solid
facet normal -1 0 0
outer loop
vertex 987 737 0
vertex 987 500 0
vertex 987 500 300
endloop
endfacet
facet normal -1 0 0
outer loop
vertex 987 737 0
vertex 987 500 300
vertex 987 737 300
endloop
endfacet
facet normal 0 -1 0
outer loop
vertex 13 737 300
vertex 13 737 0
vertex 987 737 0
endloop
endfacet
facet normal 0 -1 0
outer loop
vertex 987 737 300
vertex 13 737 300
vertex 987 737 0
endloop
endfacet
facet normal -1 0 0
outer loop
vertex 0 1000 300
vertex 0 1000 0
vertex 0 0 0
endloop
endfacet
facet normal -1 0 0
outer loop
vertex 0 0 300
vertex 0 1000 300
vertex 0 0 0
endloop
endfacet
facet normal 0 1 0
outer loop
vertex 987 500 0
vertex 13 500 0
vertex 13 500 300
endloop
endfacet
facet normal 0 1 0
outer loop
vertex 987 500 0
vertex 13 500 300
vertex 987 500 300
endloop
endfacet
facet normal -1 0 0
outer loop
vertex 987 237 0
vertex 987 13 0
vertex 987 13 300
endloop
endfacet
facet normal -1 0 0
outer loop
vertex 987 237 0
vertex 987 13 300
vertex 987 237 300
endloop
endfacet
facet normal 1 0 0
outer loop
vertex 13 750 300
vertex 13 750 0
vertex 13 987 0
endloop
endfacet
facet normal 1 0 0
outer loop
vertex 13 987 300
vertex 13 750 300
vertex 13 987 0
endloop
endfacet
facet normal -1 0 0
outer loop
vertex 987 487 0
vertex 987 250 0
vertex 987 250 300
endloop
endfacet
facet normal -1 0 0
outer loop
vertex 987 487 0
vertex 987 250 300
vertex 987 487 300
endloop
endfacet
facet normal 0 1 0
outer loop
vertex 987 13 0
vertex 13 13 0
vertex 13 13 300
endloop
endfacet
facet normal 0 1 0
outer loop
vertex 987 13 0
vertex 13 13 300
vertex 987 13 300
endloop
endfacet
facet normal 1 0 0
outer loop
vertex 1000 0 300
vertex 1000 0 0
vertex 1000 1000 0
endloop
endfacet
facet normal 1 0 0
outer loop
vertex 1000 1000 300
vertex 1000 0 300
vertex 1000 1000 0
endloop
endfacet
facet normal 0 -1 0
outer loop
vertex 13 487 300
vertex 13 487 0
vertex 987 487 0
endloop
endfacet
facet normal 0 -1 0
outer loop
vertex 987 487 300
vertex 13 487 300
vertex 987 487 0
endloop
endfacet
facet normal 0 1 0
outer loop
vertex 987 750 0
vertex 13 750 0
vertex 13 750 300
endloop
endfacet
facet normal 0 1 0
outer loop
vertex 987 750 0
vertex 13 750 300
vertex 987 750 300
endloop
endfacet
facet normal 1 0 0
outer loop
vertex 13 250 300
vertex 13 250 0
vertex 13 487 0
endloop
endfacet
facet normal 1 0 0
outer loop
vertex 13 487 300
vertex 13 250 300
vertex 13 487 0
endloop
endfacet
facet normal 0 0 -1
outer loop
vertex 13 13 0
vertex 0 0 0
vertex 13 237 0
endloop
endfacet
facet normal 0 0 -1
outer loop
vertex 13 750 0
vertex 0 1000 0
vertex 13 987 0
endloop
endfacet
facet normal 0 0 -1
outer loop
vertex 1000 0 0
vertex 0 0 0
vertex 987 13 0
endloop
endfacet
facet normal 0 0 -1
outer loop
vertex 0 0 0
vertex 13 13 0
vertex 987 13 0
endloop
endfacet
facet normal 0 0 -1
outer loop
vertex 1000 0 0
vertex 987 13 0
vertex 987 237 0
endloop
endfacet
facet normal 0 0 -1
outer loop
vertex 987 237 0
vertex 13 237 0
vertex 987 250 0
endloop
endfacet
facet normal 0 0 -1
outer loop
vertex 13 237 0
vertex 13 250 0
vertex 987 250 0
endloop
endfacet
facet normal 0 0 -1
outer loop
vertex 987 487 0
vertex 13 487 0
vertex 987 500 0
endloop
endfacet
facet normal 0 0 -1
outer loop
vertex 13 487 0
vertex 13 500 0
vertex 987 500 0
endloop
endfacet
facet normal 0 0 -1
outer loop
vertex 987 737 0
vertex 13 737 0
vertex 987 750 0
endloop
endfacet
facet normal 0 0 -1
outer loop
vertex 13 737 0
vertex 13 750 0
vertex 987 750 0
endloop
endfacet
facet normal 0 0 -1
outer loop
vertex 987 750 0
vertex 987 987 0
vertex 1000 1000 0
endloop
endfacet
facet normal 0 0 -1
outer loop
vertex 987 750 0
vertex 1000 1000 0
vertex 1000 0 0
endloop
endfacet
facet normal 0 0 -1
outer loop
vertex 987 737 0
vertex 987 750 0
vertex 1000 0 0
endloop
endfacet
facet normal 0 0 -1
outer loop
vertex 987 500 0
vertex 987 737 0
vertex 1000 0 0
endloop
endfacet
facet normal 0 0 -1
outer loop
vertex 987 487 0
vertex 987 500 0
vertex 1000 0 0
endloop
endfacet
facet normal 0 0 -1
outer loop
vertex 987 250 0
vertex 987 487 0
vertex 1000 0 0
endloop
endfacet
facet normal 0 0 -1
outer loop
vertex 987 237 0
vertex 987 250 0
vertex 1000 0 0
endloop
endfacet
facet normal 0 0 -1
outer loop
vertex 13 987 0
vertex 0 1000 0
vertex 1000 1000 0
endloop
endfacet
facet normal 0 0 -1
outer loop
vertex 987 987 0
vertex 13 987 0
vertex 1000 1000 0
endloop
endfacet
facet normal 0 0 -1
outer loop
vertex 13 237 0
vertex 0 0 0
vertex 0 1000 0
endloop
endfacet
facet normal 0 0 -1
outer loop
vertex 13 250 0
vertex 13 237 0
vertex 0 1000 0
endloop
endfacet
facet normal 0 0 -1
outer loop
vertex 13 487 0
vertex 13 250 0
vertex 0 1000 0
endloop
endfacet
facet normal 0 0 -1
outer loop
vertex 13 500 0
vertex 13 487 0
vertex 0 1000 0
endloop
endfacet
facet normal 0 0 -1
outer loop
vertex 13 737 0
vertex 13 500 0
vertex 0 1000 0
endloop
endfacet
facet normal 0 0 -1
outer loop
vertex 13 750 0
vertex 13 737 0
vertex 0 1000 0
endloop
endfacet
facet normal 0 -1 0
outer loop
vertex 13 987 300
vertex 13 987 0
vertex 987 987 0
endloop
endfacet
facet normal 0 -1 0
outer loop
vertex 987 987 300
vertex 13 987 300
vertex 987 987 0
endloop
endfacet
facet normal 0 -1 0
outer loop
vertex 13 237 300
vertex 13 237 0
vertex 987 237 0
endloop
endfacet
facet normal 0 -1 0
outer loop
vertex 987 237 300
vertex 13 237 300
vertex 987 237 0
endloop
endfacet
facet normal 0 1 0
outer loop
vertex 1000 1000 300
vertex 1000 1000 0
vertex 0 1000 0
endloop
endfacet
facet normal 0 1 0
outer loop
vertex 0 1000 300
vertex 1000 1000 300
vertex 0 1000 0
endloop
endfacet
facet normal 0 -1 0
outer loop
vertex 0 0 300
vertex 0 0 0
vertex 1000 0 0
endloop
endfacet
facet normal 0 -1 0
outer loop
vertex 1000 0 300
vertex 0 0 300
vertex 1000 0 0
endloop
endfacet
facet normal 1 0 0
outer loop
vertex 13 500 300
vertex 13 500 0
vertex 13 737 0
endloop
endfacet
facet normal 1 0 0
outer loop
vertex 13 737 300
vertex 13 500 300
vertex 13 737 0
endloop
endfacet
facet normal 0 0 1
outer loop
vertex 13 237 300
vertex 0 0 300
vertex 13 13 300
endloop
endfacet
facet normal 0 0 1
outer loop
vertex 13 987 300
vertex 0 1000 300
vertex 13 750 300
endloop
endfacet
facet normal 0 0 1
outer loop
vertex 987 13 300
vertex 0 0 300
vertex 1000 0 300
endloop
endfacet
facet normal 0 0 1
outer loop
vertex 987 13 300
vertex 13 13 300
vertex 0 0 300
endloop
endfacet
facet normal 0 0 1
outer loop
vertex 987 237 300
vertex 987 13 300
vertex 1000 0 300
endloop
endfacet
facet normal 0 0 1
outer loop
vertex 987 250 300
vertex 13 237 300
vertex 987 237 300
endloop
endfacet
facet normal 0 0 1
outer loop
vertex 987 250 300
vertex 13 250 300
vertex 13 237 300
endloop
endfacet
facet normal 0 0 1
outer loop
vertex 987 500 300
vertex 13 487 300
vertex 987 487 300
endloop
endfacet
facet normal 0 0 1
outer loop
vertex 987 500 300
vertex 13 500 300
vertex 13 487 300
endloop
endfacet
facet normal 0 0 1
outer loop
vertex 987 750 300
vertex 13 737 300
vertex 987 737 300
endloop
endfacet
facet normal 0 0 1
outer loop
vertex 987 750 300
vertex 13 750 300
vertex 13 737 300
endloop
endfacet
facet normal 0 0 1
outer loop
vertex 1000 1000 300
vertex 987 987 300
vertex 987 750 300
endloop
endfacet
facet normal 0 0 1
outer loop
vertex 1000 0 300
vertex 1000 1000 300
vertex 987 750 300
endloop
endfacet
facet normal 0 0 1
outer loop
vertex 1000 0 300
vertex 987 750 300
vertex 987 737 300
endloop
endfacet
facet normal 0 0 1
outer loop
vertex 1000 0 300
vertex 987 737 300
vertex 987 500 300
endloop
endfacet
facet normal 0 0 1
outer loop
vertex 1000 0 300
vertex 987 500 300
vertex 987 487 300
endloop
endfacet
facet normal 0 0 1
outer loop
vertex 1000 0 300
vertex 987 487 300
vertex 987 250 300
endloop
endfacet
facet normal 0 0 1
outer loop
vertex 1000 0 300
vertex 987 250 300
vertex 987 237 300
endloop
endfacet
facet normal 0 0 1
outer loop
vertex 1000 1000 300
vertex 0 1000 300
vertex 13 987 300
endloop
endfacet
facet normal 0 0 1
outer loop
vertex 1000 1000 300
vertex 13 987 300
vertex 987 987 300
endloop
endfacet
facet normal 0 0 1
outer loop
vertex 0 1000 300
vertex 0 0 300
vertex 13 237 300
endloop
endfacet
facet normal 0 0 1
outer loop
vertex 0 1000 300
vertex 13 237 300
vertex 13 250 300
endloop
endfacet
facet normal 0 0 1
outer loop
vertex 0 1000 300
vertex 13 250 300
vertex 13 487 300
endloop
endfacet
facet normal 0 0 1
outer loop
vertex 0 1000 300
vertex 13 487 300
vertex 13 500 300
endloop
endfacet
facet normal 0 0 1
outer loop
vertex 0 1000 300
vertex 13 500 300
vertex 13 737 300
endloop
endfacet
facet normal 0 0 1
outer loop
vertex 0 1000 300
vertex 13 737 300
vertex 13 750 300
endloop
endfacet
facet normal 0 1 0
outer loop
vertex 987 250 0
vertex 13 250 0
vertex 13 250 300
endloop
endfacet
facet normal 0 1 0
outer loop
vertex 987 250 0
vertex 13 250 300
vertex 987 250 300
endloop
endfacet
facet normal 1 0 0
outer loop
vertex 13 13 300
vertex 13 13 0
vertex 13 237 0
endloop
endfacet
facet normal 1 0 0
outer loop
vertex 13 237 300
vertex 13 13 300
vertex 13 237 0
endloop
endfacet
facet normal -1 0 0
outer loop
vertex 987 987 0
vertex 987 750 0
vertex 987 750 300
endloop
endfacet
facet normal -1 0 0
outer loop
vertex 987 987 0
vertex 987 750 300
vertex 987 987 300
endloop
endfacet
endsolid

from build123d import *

# Parameters (mm, degrees)
F0_W     = 974
F0_H     = 224
F0_H_2   = 237
F1_DEPTH = 300


with BuildPart() as f1:
    # F0 (on Top) → F1 (new body)
    with BuildSketch(Plane.XY):
        Polygon((0, 13), (0, 0), (1000, 0), (1000, 13), (1000, 237), (1000, 250), (1000, 500), (1000, 750), (1000, 1000), (0, 1000), (0, 750), (0, 500), (0, 250), (0, 237), align=None)
        with Locations((500, 125)):
            Rectangle(F0_W, F0_H, mode=Mode.SUBTRACT)
        with Locations((500, 368.5)):
            Rectangle(F0_W, F0_H_2, mode=Mode.SUBTRACT)
        with Locations((500, 618.5)):
            Rectangle(F0_W, F0_H_2, mode=Mode.SUBTRACT)
        with Locations((500, 868.5)):
            Rectangle(F0_W, F0_H_2, mode=Mode.SUBTRACT)
    extrude(amount=F1_DEPTH)


solid = f1.part
